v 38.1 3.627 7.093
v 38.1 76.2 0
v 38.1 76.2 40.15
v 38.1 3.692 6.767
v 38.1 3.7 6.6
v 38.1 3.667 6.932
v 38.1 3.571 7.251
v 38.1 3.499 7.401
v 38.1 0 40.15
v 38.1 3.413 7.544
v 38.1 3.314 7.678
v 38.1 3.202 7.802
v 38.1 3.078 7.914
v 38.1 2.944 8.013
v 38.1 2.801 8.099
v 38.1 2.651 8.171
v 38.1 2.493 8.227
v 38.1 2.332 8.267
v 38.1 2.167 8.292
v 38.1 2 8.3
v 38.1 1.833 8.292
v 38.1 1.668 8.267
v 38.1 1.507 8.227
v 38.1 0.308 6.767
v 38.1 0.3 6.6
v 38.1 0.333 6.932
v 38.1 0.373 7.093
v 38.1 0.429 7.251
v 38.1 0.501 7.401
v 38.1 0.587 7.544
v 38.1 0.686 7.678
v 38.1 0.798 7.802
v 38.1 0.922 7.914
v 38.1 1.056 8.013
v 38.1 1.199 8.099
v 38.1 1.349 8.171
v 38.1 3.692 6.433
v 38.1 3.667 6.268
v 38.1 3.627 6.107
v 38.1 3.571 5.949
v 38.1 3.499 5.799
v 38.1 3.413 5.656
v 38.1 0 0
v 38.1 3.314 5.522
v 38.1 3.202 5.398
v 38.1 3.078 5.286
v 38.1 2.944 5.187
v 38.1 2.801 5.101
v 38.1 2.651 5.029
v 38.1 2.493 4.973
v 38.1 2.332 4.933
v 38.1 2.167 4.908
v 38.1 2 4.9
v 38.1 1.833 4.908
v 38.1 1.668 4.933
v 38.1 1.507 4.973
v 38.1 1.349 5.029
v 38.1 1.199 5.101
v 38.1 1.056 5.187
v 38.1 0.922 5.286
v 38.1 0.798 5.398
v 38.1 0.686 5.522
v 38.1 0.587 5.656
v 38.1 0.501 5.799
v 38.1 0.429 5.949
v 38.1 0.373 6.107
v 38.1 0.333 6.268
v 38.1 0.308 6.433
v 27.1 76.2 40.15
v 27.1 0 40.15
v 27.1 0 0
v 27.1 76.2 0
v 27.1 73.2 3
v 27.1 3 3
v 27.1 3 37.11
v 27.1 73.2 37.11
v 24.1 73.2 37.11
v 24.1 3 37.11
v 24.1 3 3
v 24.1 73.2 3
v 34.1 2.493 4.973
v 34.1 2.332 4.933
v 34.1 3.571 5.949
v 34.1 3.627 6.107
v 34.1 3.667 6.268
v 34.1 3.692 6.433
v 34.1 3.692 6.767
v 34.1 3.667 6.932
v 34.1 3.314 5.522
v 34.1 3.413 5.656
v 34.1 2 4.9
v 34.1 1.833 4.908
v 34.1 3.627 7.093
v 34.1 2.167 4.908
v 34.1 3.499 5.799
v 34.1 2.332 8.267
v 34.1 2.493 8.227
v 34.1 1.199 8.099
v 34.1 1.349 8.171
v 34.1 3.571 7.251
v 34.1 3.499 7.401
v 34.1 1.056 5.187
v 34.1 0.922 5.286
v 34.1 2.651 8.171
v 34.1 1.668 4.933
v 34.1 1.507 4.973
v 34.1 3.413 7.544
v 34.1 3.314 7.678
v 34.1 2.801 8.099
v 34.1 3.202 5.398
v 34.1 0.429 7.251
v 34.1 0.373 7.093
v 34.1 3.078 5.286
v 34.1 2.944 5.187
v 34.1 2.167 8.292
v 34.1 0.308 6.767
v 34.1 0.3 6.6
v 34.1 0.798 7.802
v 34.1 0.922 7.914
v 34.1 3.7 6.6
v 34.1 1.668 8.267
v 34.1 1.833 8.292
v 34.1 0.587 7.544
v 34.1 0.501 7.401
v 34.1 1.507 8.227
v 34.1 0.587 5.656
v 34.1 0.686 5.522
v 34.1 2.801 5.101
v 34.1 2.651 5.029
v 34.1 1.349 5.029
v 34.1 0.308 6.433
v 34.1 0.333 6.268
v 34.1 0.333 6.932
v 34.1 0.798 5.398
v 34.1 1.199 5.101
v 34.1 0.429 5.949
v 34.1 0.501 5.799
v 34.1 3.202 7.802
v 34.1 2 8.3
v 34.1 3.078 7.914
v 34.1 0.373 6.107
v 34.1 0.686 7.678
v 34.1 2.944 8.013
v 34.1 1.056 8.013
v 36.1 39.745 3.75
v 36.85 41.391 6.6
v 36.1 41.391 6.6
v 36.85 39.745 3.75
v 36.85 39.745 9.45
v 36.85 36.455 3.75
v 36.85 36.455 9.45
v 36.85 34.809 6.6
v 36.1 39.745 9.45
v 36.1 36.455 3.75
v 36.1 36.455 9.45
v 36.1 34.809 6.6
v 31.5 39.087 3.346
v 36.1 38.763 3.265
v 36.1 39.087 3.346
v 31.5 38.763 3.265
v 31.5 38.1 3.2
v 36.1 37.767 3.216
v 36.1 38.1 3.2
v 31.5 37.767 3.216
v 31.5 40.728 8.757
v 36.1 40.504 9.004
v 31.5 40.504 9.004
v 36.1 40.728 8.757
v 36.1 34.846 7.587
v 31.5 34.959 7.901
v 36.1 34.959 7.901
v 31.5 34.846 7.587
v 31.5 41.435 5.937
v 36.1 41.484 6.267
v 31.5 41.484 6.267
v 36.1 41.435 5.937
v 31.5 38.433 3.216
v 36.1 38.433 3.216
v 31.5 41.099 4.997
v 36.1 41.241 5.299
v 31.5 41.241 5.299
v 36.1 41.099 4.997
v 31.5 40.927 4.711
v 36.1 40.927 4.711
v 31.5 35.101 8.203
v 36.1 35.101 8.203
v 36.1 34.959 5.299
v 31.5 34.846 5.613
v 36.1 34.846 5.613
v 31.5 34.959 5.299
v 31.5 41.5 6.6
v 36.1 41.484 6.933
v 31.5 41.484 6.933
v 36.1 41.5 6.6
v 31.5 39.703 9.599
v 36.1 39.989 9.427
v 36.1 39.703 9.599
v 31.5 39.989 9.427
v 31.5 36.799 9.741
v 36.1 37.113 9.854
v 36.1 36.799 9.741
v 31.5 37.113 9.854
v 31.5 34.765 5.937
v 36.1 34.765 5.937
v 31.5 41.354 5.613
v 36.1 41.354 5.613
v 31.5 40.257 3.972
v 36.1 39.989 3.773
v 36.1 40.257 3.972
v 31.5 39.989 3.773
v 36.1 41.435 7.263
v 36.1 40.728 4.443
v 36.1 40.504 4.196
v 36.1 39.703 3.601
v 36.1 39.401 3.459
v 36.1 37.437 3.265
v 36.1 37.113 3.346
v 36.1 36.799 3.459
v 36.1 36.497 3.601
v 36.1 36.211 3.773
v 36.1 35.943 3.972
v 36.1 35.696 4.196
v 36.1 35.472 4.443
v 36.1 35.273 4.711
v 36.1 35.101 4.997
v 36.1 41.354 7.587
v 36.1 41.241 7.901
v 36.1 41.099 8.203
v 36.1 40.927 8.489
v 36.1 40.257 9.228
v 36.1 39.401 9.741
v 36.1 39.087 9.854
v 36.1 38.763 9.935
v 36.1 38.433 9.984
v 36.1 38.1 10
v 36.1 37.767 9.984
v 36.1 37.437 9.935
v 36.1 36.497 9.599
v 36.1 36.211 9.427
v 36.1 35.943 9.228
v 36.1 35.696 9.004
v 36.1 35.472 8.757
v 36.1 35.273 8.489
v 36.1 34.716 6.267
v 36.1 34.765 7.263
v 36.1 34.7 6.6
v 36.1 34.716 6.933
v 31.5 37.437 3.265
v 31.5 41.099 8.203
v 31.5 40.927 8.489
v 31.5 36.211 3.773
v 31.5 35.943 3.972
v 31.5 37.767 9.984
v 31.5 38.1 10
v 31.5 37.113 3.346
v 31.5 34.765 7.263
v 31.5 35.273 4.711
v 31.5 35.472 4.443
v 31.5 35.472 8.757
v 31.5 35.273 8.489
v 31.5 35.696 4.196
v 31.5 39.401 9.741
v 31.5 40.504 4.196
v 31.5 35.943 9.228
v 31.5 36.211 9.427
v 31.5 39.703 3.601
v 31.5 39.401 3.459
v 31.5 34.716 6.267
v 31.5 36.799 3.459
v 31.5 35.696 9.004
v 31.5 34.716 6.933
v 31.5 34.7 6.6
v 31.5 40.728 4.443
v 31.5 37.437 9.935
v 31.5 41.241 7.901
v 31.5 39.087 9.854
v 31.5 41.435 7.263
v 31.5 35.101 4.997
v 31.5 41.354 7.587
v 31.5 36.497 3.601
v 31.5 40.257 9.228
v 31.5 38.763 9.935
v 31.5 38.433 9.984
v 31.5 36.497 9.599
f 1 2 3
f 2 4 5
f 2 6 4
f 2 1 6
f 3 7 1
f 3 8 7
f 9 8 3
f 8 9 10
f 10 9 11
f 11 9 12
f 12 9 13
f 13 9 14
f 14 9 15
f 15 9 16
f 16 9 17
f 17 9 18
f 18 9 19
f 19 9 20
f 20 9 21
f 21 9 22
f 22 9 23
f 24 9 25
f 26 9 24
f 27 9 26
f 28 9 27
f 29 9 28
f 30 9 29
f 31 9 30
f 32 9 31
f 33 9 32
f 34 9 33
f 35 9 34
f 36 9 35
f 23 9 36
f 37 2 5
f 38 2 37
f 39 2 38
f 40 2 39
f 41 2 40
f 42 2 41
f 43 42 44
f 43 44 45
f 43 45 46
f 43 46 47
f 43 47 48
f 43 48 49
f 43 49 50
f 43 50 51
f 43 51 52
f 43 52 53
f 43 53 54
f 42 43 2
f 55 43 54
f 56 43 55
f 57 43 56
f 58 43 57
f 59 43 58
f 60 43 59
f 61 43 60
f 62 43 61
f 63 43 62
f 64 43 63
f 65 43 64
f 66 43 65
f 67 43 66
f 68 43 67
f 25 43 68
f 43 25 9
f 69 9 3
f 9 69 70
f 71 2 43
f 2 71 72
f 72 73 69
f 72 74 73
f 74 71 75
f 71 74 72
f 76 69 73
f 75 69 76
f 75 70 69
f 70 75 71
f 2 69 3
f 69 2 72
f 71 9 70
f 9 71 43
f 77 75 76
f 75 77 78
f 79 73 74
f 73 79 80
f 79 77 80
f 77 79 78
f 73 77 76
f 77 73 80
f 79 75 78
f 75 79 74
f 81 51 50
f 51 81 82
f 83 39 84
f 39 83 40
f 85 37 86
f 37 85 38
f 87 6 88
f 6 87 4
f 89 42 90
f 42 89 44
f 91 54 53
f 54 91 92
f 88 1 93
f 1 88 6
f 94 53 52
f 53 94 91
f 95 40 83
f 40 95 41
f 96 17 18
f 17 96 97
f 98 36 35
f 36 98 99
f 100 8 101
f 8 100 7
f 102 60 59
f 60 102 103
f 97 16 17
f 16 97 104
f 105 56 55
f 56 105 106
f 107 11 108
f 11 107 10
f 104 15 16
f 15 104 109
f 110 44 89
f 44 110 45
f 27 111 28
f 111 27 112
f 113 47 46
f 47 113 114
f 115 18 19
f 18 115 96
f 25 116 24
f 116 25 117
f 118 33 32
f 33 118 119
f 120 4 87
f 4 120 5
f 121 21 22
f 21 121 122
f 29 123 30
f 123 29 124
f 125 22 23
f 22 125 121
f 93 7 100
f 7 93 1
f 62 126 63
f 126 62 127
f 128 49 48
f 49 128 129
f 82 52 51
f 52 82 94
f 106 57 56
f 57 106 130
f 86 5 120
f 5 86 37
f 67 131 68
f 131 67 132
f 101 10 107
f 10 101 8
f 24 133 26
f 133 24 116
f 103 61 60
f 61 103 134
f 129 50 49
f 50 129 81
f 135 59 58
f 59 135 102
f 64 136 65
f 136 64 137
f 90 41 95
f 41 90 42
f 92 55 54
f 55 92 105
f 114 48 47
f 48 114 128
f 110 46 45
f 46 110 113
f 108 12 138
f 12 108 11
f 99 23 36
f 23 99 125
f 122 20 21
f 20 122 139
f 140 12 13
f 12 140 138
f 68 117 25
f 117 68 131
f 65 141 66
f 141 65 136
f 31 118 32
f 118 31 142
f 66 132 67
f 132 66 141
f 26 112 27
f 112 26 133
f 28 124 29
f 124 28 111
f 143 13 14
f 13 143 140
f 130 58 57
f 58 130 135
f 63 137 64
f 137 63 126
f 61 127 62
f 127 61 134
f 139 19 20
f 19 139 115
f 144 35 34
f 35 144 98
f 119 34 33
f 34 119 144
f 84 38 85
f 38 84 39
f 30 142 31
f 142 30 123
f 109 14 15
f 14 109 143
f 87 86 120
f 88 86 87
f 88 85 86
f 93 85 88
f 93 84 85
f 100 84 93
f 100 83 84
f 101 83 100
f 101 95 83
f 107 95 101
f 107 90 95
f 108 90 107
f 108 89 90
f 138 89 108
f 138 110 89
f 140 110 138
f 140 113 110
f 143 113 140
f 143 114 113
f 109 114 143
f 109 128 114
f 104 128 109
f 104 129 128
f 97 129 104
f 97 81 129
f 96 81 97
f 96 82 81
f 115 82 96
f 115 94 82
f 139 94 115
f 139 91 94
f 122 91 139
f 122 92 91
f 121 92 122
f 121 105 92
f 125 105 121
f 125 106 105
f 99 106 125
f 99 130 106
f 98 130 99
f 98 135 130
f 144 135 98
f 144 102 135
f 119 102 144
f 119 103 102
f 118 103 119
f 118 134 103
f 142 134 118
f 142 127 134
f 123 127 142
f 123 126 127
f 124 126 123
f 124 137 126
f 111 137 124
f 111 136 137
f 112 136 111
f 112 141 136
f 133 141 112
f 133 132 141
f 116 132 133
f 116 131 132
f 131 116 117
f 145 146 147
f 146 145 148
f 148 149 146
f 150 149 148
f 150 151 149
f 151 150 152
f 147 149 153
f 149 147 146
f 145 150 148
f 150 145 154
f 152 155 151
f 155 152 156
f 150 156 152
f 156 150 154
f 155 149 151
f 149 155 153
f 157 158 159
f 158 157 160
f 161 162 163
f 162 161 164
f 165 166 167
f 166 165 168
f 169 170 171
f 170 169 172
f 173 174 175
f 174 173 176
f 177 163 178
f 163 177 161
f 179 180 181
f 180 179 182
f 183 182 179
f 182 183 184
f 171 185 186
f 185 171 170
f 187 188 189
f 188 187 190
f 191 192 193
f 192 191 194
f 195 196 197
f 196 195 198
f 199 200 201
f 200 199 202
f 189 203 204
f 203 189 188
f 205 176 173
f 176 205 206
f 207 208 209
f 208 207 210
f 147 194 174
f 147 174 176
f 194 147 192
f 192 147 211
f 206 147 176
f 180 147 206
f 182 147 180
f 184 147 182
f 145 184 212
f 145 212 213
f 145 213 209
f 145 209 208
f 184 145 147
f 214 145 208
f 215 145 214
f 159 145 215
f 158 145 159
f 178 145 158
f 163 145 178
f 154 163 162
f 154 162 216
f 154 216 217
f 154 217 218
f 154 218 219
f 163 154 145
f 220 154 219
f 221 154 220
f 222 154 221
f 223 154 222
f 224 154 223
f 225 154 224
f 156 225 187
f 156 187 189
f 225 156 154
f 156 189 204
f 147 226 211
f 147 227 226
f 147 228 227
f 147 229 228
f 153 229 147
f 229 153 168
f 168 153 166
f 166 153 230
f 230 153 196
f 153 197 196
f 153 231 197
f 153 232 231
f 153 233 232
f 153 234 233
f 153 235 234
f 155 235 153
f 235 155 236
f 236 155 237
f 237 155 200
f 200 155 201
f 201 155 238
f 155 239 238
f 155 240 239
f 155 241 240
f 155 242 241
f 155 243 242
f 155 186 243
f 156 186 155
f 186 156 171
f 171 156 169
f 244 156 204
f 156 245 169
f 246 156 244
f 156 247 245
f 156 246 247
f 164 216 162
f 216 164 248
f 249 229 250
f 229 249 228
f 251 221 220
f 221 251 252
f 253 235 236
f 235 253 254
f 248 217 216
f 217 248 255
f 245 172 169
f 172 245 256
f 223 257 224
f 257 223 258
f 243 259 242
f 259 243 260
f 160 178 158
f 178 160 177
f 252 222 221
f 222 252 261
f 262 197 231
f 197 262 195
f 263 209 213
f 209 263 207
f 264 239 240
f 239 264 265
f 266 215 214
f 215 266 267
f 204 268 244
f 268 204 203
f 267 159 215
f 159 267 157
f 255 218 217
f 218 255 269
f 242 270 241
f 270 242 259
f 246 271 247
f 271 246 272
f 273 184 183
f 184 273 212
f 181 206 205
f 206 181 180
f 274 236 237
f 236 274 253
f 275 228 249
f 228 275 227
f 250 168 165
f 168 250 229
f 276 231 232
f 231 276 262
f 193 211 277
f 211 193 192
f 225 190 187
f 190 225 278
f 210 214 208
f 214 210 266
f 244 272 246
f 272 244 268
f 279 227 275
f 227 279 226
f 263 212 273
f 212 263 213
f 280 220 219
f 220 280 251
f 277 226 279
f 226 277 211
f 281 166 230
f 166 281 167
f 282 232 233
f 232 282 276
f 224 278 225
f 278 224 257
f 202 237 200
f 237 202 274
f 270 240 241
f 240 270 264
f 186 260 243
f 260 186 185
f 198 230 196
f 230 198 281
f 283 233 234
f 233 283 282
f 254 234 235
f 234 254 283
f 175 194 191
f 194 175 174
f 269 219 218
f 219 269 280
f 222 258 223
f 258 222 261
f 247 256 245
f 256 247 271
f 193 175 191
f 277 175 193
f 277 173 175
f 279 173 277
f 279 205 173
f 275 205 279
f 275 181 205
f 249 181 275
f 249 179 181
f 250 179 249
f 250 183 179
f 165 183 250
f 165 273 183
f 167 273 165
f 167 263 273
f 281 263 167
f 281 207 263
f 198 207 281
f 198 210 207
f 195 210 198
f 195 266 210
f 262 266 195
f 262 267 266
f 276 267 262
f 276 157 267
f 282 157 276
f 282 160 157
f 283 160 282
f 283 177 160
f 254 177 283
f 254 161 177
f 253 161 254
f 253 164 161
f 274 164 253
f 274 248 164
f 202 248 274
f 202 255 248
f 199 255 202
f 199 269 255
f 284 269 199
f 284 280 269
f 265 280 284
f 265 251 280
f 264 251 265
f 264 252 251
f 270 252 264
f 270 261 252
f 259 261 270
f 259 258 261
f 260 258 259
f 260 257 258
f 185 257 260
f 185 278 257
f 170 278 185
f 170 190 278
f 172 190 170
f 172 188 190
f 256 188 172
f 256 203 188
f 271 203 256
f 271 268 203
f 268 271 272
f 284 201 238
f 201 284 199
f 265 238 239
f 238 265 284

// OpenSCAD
// file: config.scad
// --- Bumper bracket + cap — sizing for pew mount + tread slide-in ---
// Tread cavity matches prayer-sole v3 tread.scad groove/socket pattern.

preview = false;

// ── Kneeler reference (defaults; override with -D) ───────────────────────────
bracket_plate_t     = 5;       // kneeler-bracket.scad plate_t
bumper_h            = 23.8;    // kneeler-bumper.scad height

// ── Tread / sole (match prayer-sole v3-compound-fastened) ───────────────────
tread_tightness     = 0.1;     // matches tolerance in tread.scad
sole_plate_l        = 53;
sole_plate_w        = 18.5;
groove_overhang     = 2;

// Tread core / flange (from tread.scad)
socket_depth        = 5;
core_protrusion     = 2;
flange_clearance    = 0.2;
flange_depth        = socket_depth / 4;

// ── User exterior rules ─────────────────────────────────────────────────────
// Height: tread bounding Z + 1/2" on each side (25.4 mm total added)
side_margin_each_in = 0.5;
side_margin_each_mm = side_margin_each_in * 25.4;

// Width: (plate thickness + bumper height) + 1/2 * tread width
width_extra_half_tread = true;

// Depth of main rectangular block (pew face is at +depth along Y)
depth_in            = 3;

// ── Shell ────────────────────────────────────────────────────────────────────
wall                = 3;
corner_r            = 1;
epsilon             = 0.02;    // manifold + thin slabs (tread groove, etc.)

// ── Roof mount prism (triangular wedge, XY slab matches shell inset core) ────────────────────
mount_leg_mm        = 28;      // +Z vertical leg; horizontal roof run drives hyp_xz + plastic math below.

// Three holes evenly along roof hypotenuse (s ∈ [0,1])
hole_s_frac         = [1/6, 1/2, 5/6];

// ── Cap (single M3 BHCS) ─────────────────────────────────────────────────────
cap_split_y         = 8;       // overlap depth (mm) engaging shell + lip
bolt_diameter       = 3.4;
bolt_head_diameter  = 6.8;
bolt_head_height    = 3.6;
nut_af              = 5.7;
nut_thickness       = 2.5;
cap_wall            = 3;

// ── Computed overall box (exterior, before wedge union) ─────────────────────
tread_l             = sole_plate_l + tread_tightness;
tread_w             = sole_plate_w + tread_tightness;
core_depth          = socket_depth + core_protrusion;
radius              = socket_depth / 2;
// Approximate tread max vertical span (core + ribs + flange minkowski), conservative
tread_z_span        = (socket_depth/2 + core_depth/2) - (-core_protrusion/2 - radius)
                      + flange_depth + 4;
width_outer         = bracket_plate_t + bumper_h + (width_extra_half_tread ? tread_w / 2 : 0);
depth_mm            = depth_in * 25.4;
height_outer        = tread_z_span + 2 * side_margin_each_mm;

// Prism pre-Minkowski: hull() inset roof slab → thin ε ridge tab at outer +width_outer (−X leg = core width).
mount_wedge_width_core    = width_outer - 2 * corner_r;
mount_wedge_depth_core    = depth_mm - 2 * corner_r;
// Horizontal roof leg **corner_r → width_outer − corner_r** (matches flush wedge + shell inset).
mount_wedge_hyp_run_x     = mount_wedge_width_core;

// Groove cavity (same idea as collar bottom groove in config.scad)
groove_h            = socket_depth / 4;
groove_l            = sole_plate_l + (groove_overhang * 2) - flange_clearance;
groove_w            = sole_plate_w + (groove_overhang * 2) - flange_clearance;
bottom_socket_h     = socket_depth;

// ── Pew leg + hypoten-mount wood fasteners (after width_outer exists) ────────
// Stock the screws bite into — here 1½" nominal leg thickness (face grain).
pew_leg_thickness_in     = 1.5;
pew_leg_thickness_mm     = pew_leg_thickness_in * 25.4;

// #8 wood / structural trim screws (nominal major Ø ~0.164"); clearance in print.
wood_screw_gauge         = 8;
wood_shank_nominal_mm    = 4.17;
wood_shank_clr           = wood_shank_nominal_mm + 0.92;   // sliding fit + angled drive
wood_head_diameter       = 10;                              // Ø for flat or trim‑washer head flare
wood_countersink_depth_mm = 4.5;                            // model depth toward wood for head recess

// Max solid printed path ⟂ angled bore (~ right triangle legs mount_wedge_hyp_run_x × mount_leg_mm).
plastic_along_bore_mm =
    mount_wedge_hyp_run_x * mount_leg_mm
    / sqrt(pow(mount_wedge_hyp_run_x, 2) + pow(mount_leg_mm, 2));

// Target thread penetration into solid wood (~1″) but stay comfortably inside 1½″ leg.
tip_breakout_margin_mm  = 25.4 * 7 / 32;                     // ~7/16″ shy of opposite face / split line
target_thread_in_wood_mm = let (
    raw = pew_leg_thickness_mm - tip_breakout_margin_mm,
    floors = min(pew_leg_thickness_mm * 0.66, pew_leg_thickness_mm - 11)
) raw > 28 ? raw : floors; // thin legs: clamp to conservative thread depth

// Shank length → plastic path + usable thread (+ head flare not counting tip).
recommended_screw_length_mm = ceil(
    plastic_along_bore_mm + target_thread_in_wood_mm +
    wood_countersink_depth_mm + 2);

// Modeled axial hole (plastic + pew + fudge) — through bore for STL / slicing.
wood_bored_axial_mm =
    ceil(plastic_along_bore_mm + pew_leg_thickness_mm + plastic_along_bore_mm / 5 + 8);

/*
  Length advice (manual install):
  • With prism run≈mount_wedge_hyp_run_x and leg mount_leg_mm, path along the bore is
    plastic_along_bore_mm (~ run·L / sqrt(run²+L²)).
  • For a 1½" (≈38 mm) leg: target ~⅞″–1¼″ (22–32 mm) of thread in SOLID stock so the
    tip does not exit — use recommended_screw_length_mm above as a guide.
  • Typical pick: **#8 × 2¼" (57 mm)** or **#8 × 2" (51 mm)** trim / cabinet / GRK‑style screws;
    soft pine may use shorter; cranky oak may use longer only if angled path stays in meat.
  • Pilot: softwood ~7/64″ (≈2.75 mm); hardwood ~9/64″ (≈3.57 mm).
*/

// ── Derived cap extents (needs height_outer, wall, epsilon, cap_split_y, cap_wall) ──
cap_inner_h         = height_outer - 2 * wall - epsilon * 2;
cap_x_ext           = cap_split_y + cap_wall;

// Rough filament check (SolidWorks / slicer is authoritative):
// Outer box-only volume ≈ width_outer × depth_mm × height_outer.
// Mount triangular prism above roof; wedge volume ~ ½ × width_outer × mount_leg_mm × depth_mm (pre-rounding).
// file: bumper-parts.scad
include <config.scad>

// Shared modules: bumper bracket body + cap (single M3). See bumper-bracket.scad / bumper-cap.scad.

$fn = preview ? 32 : 64;

// Triangular prism + overlap slab. Apex +X matches shell inset rim (**xr = width_outer − corner_r**) so wedge
// max **x** matches shell core (flush); outer +X becomes a vertical face at **x = xr** joint with cube right wall.
module mount_wedge_primitive(overlap_below = corner_r) {
    bx = corner_r;
    by = corner_r;
    Dc = mount_wedge_depth_core;
    xr = bx + mount_wedge_width_core; // width_outer − corner_r — same max **x** as shell inset cube top
    Zr = mount_leg_mm;

    translate([bx, by, -overlap_below])
        cube([mount_wedge_width_core, Dc, overlap_below]);

    polyhedron(
        points = [
            [bx, by, 0],       // 0 lf roof
            [xr, by, 0],       // 1 rf roof / +X rim
            [xr, by, Zr],      // 2 apex −Y cap
            [bx, by + Dc, 0],  // 3 lf roof (+Y)
            [xr, by + Dc, 0],  // 4 rf roof (+Y)
            [xr, by + Dc, Zr], // 5 apex +Y cap
        ],
        faces = [
            [0, 1, 4, 3],       // footprint on roof plane (inside union with cube top)
            [1, 2, 5, 4],       // outer +X vertical façade at **x = xr**
            [0, 3, 5, 2],       // hypotenuse (single sloped face)
            [0, 2, 1],          // cap triangle y = by
            [3, 4, 5],          // cap triangle y = by + Dc
        ],
        convexity = 4
    );
}

module main_block_shell() {
    difference() {
        minkowski() {
            union() {
                translate([corner_r, corner_r, corner_r])
                    cube([
                        width_outer - 2 * corner_r,
                        depth_mm - 2 * corner_r,
                        // Extend to roof z = height_outer (not H−2·corner_r) so top matches prism slab plane;
                        // otherwise core ended at z = H−corner_r vs slab at z = H ⇒ exterior seam ring after minkowski.
                        height_outer - corner_r,
                    ]);
                translate([0, 0, height_outer])
                    mount_wedge_primitive();
            }
            sphere(r=corner_r, $fn=preview ? 16 : 24);
        }
        translate([wall, wall, wall])
            cube([width_outer - 2 * wall, depth_mm - 2 * wall, height_outer - 2 * wall + 1]);
    }
}

// Tread cavity: groove_l / tread_l (−− long sole) parallel to +Y (3″ pew depth).
// Sole width (groove_w / tread_w) across +X toward peg stack — slide flange along ±Y via low‑X opening.
module tread_clearance_cutout() {
    cx = width_outer / 2;
    cy = depth_mm / 2;
    floor_z = wall + 0.5;
    z_socket = floor_z + bottom_socket_h / 2;
    groove_z = floor_z + bottom_socket_h - groove_h / 2 - 1;

    translate([cx, cy, z_socket])
        cube([tread_w + 0.5, tread_l + 0.5, bottom_socket_h + 0.5], center=true);

    translate([cx, cy, z_socket + bottom_socket_h / 2 + core_depth / 2])
        cube([tread_w + 0.5, tread_l + 0.5, core_depth + 0.5], center=true);

    translate([cx, cy, groove_z])
        minkowski() {
            cube([groove_w - 2 + 0.5, groove_l - 2 + 0.5, groove_h], center=true);
            sphere(r=1.0, $fn=preview ? 12 : 24);
        }

    translate([cx, cy, floor_z + bottom_socket_h * 0.35])
        cube([tread_w + 8, tread_l + 4, radius * 2 + 4], center=true);
}

module slide_entrance_cut() {
    translate([wall - 2, depth_mm / 2, wall + bottom_socket_h * 0.5])
        cube([wall + 8, groove_l + 6, groove_h + core_depth + bottom_socket_h], center=true);
}

// Hypotenuse on prism roof (+corner_r toward outer ε ridge); s ∈ [0,1] along roof line then +mount_leg tilt.
function hyp_xz(s) = [
    corner_r + mount_wedge_hyp_run_x * s,
    mount_leg_mm * s,
];

// Axis ⟂ hypotenuse in XZ; hull in Y ⇒ through-holes across mount depth.
module wood_hole_through(s) {
    xz_plane = hyp_xz(s); // wedge local coords (roof z = 0)
    xz_w = [ xz_plane[0], xz_plane[1] + height_outer ];
    // Angle of hypotenuse in roof XZ (~atan2(+Z,+ΔX)).
    psi_deg = atan2(mount_leg_mm, mount_wedge_hyp_run_x);
    ry_deg = psi_deg + 90;
    hull() {
        for (yi = [-1.5, depth_mm + 1.5])
            translate([xz_w[0], yi, xz_w[1]])
                rotate([0, ry_deg, 0])
                    cylinder(
                        h=wood_bored_axial_mm,
                        d=wood_shank_clr,
                        center=true,
                        $fn=preview ? 28 : 64
                    );
    }
}

module wood_screw_pattern_primitive() {
    for (s = hole_s_frac)
        wood_hole_through(s);
}

module wood_screw_pattern() {
    translate([0, 0, height_outer])
        wood_screw_pattern_primitive();
}

// 180° Rx on the tread cavity + slide slot only, pivot = geometric center of those voids
// (same [cx, cy] as pocket; Z = mid of socket/groove/slide stack) so the bracket shell does not “tilt”.
module tread_cutouts_rx180() {
    cx = width_outer / 2;
    cy = depth_mm / 2;
    floor_z = wall + 0.5;
    z_socket = floor_z + bottom_socket_h / 2;
    groove_z = floor_z + bottom_socket_h - groove_h / 2 - 1;
    rib_cz = floor_z + bottom_socket_h * 0.35;
    rib_half = (radius * 2 + 4) / 2;
    z_lo = min(
        z_socket - bottom_socket_h / 2 - 0.25,
        groove_z - groove_h / 2 - 2,
        rib_cz - rib_half
    );
    z_hi = max(
        z_socket + bottom_socket_h / 2 + core_depth + 0.25,
        groove_z + groove_h / 2 + 2,
        rib_cz + rib_half
    );
    slide_cz = wall + bottom_socket_h * 0.5;
    slide_half = (groove_h + core_depth + bottom_socket_h) / 2;
    pz = (min(z_lo, slide_cz - slide_half) + max(z_hi, slide_cz + slide_half)) / 2;

    translate([cx, cy, pz])
        rotate([180, 0, 0])
            translate([-cx, -cy, -pz]) {
                tread_clearance_cutout();
                slide_entrance_cut();
            }
}

module bumper_bracket() {
    difference() {
        main_block_shell();
        tread_cutouts_rx180();
        wood_screw_pattern();
    }
}

module bumper_cap() {
    difference() {
        union() {
            translate([width_outer - cap_x_ext, 0, 0])
                cube([cap_x_ext, depth_mm, height_outer]);
            translate([width_outer - cap_x_ext - cap_wall, wall, wall])
                cube([cap_wall + 1, depth_mm - 2 * wall, cap_inner_h]);
        }
        translate([width_outer - cap_wall - 1, wall - 1, wall + bolt_head_height])
            rotate([0, 90, 0])
                cylinder(h=cap_x_ext + cap_wall + 4, d=bolt_diameter, center=false);
        translate([width_outer - wall - 0.5, wall + (depth_mm - 2 * wall) / 2, wall + bolt_head_height])
            rotate([0, 90, 0])
                rotate([0, 0, 30])
                    cylinder(h=nut_thickness + 2, r=(nut_af / 2) / cos(30), $fn=6, center=true);
        translate([width_outer - cap_wall - bolt_head_height, wall + (depth_mm - 2 * wall) / 2, wall + bolt_head_height])
            rotate([0, 90, 0])
                cylinder(h=bolt_head_height + 1, d=bolt_head_diameter, center=false);
    }
}

module bumper_assembly() {
    color([0.75, 0.72, 0.68]) bumper_bracket();
    color([0.55, 0.58, 0.62], 0.85) bumper_cap();
}
// main file
// Cap: single M3, mates to +X end of bumper-bracket.scad in shared coordinates.
include <bumper-parts.scad>

bumper_cap();
